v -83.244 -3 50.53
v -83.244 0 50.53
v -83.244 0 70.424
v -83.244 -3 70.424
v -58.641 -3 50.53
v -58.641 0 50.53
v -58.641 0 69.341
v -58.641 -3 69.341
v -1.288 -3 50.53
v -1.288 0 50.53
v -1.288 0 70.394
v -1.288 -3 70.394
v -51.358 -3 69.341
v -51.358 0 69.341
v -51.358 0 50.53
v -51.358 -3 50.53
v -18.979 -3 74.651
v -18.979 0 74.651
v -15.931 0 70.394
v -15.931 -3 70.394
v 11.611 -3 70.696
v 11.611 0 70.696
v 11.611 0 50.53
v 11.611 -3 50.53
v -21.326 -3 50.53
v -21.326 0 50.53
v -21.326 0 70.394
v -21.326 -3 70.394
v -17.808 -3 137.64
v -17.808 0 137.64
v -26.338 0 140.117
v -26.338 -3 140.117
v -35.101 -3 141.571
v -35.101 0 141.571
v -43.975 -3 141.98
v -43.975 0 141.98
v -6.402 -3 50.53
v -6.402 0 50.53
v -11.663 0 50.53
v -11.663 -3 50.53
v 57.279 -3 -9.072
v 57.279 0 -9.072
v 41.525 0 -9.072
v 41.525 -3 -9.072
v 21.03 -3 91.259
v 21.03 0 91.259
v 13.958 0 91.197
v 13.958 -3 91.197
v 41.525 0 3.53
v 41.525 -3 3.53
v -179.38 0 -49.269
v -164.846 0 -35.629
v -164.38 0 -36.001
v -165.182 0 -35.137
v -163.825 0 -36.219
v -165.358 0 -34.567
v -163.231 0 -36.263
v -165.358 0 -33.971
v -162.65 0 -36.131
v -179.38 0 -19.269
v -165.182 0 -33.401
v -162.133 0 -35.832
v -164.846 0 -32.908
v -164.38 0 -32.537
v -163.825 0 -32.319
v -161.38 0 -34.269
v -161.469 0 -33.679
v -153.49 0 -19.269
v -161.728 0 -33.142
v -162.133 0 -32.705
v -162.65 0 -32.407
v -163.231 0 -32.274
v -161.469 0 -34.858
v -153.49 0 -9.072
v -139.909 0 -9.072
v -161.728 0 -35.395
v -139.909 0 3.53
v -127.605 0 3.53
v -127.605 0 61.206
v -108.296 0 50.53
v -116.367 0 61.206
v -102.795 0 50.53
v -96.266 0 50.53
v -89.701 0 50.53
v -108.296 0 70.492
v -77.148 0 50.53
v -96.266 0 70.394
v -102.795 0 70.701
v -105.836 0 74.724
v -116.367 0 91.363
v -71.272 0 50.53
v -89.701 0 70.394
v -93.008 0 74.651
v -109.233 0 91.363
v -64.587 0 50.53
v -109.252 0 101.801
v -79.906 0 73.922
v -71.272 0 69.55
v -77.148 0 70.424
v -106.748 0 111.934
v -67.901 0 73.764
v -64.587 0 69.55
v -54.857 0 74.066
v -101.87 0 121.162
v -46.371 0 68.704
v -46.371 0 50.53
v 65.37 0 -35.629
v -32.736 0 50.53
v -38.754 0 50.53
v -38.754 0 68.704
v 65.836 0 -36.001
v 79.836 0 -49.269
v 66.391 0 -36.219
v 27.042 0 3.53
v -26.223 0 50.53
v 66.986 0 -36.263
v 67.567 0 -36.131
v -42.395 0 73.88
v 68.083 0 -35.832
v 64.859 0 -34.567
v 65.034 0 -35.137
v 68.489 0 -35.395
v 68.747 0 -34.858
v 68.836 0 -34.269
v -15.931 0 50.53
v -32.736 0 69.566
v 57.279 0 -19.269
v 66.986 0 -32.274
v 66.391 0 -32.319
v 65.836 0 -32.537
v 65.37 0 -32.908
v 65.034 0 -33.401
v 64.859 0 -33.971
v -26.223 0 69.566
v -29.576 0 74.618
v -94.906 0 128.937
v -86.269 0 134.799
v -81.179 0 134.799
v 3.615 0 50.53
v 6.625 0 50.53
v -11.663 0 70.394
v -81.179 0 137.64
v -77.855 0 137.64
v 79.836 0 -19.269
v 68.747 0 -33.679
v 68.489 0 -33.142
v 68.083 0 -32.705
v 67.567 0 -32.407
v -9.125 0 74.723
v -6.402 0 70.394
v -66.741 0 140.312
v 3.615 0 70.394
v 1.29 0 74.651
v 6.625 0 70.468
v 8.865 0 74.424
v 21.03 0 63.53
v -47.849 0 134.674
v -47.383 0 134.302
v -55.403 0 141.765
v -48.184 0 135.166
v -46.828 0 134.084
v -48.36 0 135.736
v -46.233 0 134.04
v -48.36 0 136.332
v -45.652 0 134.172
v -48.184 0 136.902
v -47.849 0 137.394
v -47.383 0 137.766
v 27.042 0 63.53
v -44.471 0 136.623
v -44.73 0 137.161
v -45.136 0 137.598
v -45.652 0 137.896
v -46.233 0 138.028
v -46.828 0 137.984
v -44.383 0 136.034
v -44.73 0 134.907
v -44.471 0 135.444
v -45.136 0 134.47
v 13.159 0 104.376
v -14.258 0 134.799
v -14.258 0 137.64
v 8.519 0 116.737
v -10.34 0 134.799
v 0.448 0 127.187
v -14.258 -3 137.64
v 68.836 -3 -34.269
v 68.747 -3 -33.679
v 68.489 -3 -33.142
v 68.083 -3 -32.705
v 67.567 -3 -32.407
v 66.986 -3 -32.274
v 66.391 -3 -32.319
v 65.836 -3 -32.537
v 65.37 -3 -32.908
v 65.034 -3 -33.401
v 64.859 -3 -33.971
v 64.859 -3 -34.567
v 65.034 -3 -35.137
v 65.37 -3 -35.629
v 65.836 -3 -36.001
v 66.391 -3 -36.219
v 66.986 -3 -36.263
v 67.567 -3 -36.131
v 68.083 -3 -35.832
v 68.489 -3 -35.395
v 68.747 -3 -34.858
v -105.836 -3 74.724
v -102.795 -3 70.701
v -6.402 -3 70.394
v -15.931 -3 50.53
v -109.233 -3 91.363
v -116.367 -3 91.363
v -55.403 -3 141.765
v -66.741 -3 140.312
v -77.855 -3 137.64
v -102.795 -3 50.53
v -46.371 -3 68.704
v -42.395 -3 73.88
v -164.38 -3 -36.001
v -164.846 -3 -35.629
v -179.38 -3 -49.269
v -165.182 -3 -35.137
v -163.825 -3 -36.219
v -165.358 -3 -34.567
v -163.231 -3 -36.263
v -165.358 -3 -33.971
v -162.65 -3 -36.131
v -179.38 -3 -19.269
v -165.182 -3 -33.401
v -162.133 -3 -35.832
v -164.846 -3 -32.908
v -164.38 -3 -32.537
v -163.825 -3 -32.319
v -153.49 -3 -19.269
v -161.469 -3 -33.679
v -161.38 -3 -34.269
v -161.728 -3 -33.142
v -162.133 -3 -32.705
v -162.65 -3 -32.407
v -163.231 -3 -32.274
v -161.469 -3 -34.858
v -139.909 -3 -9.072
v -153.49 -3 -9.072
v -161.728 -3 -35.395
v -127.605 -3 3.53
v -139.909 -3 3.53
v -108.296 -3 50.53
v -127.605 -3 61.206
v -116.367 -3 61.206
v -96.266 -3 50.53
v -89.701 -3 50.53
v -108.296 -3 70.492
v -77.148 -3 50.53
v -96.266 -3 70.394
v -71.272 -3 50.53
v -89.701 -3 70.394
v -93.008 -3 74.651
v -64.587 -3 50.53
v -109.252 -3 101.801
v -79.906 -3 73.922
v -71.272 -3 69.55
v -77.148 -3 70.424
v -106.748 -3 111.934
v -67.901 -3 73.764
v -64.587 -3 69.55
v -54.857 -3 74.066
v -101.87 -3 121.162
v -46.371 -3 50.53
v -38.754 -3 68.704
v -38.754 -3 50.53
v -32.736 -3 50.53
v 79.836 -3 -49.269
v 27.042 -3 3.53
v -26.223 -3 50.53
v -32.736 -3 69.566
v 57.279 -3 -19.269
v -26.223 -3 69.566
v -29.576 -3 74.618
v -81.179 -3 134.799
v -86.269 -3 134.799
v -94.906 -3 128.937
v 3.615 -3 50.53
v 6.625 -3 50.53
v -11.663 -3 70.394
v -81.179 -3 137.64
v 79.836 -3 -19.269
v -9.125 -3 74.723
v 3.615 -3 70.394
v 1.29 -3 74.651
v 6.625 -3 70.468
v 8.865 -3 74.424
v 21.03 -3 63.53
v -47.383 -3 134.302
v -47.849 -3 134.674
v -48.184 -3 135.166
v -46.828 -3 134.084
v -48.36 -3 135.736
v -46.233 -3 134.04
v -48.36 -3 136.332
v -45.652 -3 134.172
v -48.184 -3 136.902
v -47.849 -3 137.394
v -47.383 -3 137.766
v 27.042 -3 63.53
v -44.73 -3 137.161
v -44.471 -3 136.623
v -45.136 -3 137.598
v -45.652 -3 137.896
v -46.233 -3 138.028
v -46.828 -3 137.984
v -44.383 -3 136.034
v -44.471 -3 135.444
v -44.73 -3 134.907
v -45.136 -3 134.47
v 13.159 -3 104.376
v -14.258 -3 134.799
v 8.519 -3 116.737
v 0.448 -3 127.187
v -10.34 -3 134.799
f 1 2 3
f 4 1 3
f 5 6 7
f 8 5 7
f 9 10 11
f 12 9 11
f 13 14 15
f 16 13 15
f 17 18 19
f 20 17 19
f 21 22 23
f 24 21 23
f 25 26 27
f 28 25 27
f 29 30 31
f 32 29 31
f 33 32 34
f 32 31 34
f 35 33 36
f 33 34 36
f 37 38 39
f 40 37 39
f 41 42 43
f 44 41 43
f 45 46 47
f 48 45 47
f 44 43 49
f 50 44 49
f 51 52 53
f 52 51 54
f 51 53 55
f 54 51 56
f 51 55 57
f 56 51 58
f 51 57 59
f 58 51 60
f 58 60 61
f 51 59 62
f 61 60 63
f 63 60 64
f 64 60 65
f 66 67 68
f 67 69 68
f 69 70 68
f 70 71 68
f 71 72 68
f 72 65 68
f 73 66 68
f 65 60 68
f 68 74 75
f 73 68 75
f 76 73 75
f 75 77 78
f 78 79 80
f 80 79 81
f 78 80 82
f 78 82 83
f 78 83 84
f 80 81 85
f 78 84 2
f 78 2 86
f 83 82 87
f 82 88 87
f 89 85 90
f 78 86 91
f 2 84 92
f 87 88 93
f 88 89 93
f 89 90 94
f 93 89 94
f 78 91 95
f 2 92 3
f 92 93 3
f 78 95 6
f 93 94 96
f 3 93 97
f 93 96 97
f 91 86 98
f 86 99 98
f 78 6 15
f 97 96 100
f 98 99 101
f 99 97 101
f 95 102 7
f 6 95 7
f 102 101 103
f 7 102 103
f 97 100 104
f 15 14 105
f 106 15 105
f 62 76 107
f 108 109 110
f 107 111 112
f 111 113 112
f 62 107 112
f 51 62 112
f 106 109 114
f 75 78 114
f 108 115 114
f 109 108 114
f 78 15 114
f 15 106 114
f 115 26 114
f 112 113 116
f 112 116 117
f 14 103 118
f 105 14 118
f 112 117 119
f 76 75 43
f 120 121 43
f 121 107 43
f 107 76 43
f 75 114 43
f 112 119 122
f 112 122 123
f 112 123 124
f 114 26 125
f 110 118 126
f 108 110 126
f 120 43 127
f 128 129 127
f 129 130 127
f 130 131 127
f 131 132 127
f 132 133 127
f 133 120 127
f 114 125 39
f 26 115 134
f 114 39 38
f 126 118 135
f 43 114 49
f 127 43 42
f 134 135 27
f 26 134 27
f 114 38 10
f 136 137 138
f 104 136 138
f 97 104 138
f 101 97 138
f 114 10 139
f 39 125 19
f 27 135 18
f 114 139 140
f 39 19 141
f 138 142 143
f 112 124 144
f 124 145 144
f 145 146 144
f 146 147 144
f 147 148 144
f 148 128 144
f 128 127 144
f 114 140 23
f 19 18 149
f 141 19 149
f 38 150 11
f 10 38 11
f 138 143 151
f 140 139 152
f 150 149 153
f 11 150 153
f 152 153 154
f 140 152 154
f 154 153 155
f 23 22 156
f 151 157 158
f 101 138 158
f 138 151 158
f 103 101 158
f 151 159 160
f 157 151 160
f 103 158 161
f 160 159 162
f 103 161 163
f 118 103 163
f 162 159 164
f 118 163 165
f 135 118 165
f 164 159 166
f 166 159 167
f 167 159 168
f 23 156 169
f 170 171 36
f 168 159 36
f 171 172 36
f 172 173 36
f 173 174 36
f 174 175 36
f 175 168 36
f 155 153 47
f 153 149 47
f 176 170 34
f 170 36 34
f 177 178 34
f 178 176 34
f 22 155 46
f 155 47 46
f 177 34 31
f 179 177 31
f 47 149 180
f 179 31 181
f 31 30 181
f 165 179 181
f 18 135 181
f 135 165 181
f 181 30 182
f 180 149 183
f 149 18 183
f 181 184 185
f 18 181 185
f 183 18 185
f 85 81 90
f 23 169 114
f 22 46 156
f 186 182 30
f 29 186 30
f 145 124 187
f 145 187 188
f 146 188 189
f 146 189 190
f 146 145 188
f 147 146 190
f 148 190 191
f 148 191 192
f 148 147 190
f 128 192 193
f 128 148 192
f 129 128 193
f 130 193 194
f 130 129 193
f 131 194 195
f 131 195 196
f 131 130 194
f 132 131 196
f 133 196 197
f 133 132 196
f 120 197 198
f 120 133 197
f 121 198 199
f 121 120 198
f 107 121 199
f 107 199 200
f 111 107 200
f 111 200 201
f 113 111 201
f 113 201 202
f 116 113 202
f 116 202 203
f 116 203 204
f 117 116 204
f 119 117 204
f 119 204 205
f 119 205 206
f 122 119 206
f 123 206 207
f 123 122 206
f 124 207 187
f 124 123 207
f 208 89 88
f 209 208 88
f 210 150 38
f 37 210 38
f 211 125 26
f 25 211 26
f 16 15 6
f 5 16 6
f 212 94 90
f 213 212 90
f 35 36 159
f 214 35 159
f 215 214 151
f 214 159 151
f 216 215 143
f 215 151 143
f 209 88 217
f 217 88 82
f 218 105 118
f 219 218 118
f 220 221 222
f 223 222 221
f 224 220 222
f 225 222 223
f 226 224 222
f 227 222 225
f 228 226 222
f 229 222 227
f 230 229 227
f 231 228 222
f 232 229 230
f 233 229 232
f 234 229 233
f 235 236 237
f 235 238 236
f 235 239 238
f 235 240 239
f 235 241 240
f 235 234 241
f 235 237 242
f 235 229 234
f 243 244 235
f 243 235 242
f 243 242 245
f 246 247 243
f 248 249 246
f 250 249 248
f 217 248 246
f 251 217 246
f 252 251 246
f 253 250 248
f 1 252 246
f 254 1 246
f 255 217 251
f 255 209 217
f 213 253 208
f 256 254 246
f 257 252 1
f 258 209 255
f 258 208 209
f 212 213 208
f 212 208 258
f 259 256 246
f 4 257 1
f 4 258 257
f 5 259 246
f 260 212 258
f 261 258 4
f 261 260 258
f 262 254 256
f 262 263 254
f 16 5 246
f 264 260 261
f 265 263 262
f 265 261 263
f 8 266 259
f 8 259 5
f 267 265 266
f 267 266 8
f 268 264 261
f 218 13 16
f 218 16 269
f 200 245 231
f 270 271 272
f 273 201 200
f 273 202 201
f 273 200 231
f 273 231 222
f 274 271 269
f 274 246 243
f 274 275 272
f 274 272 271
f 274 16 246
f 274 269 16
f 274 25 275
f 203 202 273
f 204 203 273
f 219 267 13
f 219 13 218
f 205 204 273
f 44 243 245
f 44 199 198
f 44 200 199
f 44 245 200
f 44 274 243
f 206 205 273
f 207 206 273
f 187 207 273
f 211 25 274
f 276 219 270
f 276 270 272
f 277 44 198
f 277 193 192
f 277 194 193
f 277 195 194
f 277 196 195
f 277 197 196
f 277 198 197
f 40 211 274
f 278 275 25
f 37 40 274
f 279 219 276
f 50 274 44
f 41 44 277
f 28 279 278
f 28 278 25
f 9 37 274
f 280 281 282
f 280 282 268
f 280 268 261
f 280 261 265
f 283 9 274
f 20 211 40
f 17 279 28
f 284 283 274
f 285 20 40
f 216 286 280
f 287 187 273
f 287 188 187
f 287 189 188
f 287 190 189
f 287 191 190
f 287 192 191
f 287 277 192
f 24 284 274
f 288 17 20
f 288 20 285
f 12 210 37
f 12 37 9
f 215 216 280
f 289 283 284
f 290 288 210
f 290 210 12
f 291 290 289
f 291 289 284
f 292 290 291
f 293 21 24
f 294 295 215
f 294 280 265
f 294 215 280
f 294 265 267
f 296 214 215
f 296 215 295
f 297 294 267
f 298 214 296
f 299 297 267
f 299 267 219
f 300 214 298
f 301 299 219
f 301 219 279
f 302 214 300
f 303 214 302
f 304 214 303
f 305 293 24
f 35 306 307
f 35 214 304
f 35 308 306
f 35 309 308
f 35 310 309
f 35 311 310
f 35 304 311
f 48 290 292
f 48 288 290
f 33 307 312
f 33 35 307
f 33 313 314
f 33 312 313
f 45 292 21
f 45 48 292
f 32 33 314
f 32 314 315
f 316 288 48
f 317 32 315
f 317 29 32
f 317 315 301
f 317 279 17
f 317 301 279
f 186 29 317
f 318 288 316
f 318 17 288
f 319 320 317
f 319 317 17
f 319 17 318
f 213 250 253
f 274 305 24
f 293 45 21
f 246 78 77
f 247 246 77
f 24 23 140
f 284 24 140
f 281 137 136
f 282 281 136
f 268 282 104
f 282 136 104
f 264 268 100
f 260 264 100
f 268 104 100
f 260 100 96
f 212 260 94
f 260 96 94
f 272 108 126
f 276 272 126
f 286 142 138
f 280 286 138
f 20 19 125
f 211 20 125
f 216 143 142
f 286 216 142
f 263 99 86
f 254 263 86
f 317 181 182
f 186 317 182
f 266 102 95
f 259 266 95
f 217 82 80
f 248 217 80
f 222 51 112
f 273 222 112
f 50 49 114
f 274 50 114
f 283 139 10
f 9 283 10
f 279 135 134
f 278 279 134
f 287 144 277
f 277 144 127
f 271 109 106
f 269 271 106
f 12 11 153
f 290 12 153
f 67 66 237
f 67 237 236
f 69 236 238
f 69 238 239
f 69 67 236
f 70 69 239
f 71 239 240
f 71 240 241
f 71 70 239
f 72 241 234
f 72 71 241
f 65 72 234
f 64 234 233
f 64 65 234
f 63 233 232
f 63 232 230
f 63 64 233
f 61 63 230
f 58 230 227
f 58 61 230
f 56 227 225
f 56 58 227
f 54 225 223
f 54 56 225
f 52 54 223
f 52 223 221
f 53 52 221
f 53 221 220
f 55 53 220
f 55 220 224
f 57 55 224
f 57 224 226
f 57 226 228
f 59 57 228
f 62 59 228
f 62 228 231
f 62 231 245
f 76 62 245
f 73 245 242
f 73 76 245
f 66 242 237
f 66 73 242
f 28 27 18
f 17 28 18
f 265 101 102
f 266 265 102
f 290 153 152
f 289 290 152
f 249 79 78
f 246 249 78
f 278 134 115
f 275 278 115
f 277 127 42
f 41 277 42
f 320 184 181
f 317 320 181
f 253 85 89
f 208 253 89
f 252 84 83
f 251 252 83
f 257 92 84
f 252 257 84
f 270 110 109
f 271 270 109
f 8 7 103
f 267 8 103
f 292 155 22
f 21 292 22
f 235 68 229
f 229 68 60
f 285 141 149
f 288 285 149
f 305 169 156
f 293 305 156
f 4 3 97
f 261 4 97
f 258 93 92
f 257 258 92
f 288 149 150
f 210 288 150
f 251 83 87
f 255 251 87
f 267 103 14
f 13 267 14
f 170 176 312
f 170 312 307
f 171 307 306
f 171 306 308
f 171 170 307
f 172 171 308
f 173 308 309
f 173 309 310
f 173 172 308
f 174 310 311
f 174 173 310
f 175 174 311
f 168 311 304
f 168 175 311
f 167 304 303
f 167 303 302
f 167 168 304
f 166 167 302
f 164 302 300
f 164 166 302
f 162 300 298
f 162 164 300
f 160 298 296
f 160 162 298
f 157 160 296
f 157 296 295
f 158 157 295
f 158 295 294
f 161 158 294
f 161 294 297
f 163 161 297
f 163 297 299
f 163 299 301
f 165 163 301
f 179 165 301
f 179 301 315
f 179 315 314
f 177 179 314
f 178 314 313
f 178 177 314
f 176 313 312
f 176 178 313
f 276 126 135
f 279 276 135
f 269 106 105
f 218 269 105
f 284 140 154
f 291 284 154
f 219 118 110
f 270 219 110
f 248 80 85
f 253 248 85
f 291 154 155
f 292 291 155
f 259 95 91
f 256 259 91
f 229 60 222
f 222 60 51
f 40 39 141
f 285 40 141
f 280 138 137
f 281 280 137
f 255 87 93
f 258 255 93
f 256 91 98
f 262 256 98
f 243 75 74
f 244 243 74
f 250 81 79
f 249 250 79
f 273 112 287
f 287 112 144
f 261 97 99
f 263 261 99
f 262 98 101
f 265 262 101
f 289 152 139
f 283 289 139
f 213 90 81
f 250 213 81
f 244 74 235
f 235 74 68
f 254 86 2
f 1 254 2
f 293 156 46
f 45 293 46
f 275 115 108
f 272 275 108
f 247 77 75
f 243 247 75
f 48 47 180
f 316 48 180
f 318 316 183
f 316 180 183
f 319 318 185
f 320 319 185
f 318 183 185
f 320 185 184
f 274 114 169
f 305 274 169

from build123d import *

# Parameters (mm, degrees)
F0_R     = 2
F1_DEPTH = 3


with BuildPart() as f1:
    # F0 (on Front) → F1 (new body)
    with BuildSketch(Plane.XZ):
        Polygon((-116.36717, 91.362698), (-116.36717, 61.206273), (-108.296373, 50.529602), (-108.296373, 70.491589), (-105.836282, 74.723937), (-102.795032, 70.700737), (-102.795032, 50.529602), (-96.265585, 50.529602), (-96.265585, 70.393569), (-93.008241, 74.651143), (-89.701266, 70.393569), (-89.701266, 50.529602), (-83.244497, 50.529602), (-83.244497, 70.423895), (-79.906239, 73.922077), (-77.148117, 70.423895), (-77.148117, 50.529602), (-71.271746, 50.529602), (-71.271746, 69.549546), (-67.90149, 73.764265), (-64.586512, 69.549546), (-64.586512, 50.529602), (-58.640746, 50.529602), (-58.640746, 69.340751), (-54.856984, 74.066021), (-51.358108, 69.340751), (-51.358108, 50.529602), (-46.37086, 50.529602), (-46.37086, 68.703967), (-42.394505, 73.879614), (-38.753841, 68.703967), (-38.753841, 50.529602), (-32.736491, 50.529602), (-32.736491, 69.565687), (-29.575566, 74.61762), (-26.222558, 69.565687), (-26.222558, 50.529602), (-21.325707, 50.529602), (-21.325707, 70.393569), (-18.979074, 74.651143), (-15.930735, 70.393569), (-15.930735, 50.529602), (-11.662976, 50.529602), (-11.662976, 70.393569), (-9.12501, 74.723019), (-6.402003, 70.393569), (-6.402003, 50.529602), (-1.288212, 50.529602), (-1.288212, 70.393569), (1.289989, 74.651143), (3.614716, 70.393569), (3.614716, 50.529602), (6.625234, 50.529602), (6.625234, 70.468216), (8.86461, 74.424437), (11.610716, 70.696345), (11.610716, 50.529602), (15.495674, 50.529602), (21.029814, 63.529602), (21.029814, 91.2588), (13.958036, 91.197406), (-7.926733, 91.007412), (-109.232884, 91.362698), align=None)
        with BuildLine():
            ThreePointArc((-86.268887, 134.798962), (-104.59103, 116.697095), (-109.232884, 91.362698))
            Line((-109.232884, 91.362698), (-7.926733, 91.007412))
            Line((-7.926733, 91.007412), (13.958036, 91.197406))
            ThreePointArc((13.958036, 91.197406), (8.519054, 116.737455), (-10.339861, 134.798962))
            Line((-10.339861, 134.798962), (-14.25776, 134.798962))
            Line((-14.25776, 134.798962), (-14.25776, 137.639998))
            Line((-14.25776, 137.639998), (-17.807812, 137.639998))
            ThreePointArc((-17.807812, 137.639998), (-30.698392, 140.973244), (-43.974803, 141.980461))
            ThreePointArc((-43.974803, 141.980461), (-61.091751, 141.192299), (-77.854575, 137.639998))
            Line((-77.854575, 137.639998), (-81.178934, 137.639998))
            Line((-81.178934, 137.639998), (-81.178934, 134.798962))
            Line((-81.178934, 134.798962), (-86.268887, 134.798962))
        make_face()
        with Locations((-46.382562, 136.033968)):
            Circle(F0_R, mode=Mode.SUBTRACT)
        Polygon((-127.604582, 61.206273), (-127.604582, 3.529602), (27.042171, 3.529602), (27.042171, 63.529602), (21.029814, 63.529602), (15.495674, 50.529602), (11.610716, 50.529602), (6.625234, 50.529602), (3.614716, 50.529602), (-1.288212, 50.529602), (-6.402003, 50.529602), (-11.662976, 50.529602), (-15.930735, 50.529602), (-21.325707, 50.529602), (-26.222558, 50.529602), (-32.736491, 50.529602), (-38.753841, 50.529602), (-46.37086, 50.529602), (-51.358108, 50.529602), (-58.640746, 50.529602), (-64.586512, 50.529602), (-71.271746, 50.529602), (-77.148117, 50.529602), (-83.244497, 50.529602), (-89.701266, 50.529602), (-96.265585, 50.529602), (-102.795032, 50.529602), (-108.296373, 50.529602), (-116.36717, 61.206273), align=None)
        Polygon((-153.489637, -9.072431), (-153.489637, -19.268759), (57.278608, -19.268759), (57.278608, -9.072431), (41.525324, -9.072431), (-139.909211, -9.072431), align=None)
        Polygon((-139.909211, 3.529602), (-139.909211, -9.072431), (41.525324, -9.072431), (41.525324, 3.529602), (27.042171, 3.529602), (-127.604582, 3.529602), align=None)
        Polygon((-153.489637, -19.268759), (-179.380361, -19.268759), (-179.380361, -49.268759), (79.836207, -49.268759), (79.836207, -19.268759), (57.278608, -19.268759), align=None)
        with Locations((-163.380361, -34.268759)):
            Circle(F0_R, mode=Mode.SUBTRACT)
        with Locations((66.836207, -34.268759)):
            Circle(F0_R, mode=Mode.SUBTRACT)
    extrude(amount=F1_DEPTH)


solid = f1.part
